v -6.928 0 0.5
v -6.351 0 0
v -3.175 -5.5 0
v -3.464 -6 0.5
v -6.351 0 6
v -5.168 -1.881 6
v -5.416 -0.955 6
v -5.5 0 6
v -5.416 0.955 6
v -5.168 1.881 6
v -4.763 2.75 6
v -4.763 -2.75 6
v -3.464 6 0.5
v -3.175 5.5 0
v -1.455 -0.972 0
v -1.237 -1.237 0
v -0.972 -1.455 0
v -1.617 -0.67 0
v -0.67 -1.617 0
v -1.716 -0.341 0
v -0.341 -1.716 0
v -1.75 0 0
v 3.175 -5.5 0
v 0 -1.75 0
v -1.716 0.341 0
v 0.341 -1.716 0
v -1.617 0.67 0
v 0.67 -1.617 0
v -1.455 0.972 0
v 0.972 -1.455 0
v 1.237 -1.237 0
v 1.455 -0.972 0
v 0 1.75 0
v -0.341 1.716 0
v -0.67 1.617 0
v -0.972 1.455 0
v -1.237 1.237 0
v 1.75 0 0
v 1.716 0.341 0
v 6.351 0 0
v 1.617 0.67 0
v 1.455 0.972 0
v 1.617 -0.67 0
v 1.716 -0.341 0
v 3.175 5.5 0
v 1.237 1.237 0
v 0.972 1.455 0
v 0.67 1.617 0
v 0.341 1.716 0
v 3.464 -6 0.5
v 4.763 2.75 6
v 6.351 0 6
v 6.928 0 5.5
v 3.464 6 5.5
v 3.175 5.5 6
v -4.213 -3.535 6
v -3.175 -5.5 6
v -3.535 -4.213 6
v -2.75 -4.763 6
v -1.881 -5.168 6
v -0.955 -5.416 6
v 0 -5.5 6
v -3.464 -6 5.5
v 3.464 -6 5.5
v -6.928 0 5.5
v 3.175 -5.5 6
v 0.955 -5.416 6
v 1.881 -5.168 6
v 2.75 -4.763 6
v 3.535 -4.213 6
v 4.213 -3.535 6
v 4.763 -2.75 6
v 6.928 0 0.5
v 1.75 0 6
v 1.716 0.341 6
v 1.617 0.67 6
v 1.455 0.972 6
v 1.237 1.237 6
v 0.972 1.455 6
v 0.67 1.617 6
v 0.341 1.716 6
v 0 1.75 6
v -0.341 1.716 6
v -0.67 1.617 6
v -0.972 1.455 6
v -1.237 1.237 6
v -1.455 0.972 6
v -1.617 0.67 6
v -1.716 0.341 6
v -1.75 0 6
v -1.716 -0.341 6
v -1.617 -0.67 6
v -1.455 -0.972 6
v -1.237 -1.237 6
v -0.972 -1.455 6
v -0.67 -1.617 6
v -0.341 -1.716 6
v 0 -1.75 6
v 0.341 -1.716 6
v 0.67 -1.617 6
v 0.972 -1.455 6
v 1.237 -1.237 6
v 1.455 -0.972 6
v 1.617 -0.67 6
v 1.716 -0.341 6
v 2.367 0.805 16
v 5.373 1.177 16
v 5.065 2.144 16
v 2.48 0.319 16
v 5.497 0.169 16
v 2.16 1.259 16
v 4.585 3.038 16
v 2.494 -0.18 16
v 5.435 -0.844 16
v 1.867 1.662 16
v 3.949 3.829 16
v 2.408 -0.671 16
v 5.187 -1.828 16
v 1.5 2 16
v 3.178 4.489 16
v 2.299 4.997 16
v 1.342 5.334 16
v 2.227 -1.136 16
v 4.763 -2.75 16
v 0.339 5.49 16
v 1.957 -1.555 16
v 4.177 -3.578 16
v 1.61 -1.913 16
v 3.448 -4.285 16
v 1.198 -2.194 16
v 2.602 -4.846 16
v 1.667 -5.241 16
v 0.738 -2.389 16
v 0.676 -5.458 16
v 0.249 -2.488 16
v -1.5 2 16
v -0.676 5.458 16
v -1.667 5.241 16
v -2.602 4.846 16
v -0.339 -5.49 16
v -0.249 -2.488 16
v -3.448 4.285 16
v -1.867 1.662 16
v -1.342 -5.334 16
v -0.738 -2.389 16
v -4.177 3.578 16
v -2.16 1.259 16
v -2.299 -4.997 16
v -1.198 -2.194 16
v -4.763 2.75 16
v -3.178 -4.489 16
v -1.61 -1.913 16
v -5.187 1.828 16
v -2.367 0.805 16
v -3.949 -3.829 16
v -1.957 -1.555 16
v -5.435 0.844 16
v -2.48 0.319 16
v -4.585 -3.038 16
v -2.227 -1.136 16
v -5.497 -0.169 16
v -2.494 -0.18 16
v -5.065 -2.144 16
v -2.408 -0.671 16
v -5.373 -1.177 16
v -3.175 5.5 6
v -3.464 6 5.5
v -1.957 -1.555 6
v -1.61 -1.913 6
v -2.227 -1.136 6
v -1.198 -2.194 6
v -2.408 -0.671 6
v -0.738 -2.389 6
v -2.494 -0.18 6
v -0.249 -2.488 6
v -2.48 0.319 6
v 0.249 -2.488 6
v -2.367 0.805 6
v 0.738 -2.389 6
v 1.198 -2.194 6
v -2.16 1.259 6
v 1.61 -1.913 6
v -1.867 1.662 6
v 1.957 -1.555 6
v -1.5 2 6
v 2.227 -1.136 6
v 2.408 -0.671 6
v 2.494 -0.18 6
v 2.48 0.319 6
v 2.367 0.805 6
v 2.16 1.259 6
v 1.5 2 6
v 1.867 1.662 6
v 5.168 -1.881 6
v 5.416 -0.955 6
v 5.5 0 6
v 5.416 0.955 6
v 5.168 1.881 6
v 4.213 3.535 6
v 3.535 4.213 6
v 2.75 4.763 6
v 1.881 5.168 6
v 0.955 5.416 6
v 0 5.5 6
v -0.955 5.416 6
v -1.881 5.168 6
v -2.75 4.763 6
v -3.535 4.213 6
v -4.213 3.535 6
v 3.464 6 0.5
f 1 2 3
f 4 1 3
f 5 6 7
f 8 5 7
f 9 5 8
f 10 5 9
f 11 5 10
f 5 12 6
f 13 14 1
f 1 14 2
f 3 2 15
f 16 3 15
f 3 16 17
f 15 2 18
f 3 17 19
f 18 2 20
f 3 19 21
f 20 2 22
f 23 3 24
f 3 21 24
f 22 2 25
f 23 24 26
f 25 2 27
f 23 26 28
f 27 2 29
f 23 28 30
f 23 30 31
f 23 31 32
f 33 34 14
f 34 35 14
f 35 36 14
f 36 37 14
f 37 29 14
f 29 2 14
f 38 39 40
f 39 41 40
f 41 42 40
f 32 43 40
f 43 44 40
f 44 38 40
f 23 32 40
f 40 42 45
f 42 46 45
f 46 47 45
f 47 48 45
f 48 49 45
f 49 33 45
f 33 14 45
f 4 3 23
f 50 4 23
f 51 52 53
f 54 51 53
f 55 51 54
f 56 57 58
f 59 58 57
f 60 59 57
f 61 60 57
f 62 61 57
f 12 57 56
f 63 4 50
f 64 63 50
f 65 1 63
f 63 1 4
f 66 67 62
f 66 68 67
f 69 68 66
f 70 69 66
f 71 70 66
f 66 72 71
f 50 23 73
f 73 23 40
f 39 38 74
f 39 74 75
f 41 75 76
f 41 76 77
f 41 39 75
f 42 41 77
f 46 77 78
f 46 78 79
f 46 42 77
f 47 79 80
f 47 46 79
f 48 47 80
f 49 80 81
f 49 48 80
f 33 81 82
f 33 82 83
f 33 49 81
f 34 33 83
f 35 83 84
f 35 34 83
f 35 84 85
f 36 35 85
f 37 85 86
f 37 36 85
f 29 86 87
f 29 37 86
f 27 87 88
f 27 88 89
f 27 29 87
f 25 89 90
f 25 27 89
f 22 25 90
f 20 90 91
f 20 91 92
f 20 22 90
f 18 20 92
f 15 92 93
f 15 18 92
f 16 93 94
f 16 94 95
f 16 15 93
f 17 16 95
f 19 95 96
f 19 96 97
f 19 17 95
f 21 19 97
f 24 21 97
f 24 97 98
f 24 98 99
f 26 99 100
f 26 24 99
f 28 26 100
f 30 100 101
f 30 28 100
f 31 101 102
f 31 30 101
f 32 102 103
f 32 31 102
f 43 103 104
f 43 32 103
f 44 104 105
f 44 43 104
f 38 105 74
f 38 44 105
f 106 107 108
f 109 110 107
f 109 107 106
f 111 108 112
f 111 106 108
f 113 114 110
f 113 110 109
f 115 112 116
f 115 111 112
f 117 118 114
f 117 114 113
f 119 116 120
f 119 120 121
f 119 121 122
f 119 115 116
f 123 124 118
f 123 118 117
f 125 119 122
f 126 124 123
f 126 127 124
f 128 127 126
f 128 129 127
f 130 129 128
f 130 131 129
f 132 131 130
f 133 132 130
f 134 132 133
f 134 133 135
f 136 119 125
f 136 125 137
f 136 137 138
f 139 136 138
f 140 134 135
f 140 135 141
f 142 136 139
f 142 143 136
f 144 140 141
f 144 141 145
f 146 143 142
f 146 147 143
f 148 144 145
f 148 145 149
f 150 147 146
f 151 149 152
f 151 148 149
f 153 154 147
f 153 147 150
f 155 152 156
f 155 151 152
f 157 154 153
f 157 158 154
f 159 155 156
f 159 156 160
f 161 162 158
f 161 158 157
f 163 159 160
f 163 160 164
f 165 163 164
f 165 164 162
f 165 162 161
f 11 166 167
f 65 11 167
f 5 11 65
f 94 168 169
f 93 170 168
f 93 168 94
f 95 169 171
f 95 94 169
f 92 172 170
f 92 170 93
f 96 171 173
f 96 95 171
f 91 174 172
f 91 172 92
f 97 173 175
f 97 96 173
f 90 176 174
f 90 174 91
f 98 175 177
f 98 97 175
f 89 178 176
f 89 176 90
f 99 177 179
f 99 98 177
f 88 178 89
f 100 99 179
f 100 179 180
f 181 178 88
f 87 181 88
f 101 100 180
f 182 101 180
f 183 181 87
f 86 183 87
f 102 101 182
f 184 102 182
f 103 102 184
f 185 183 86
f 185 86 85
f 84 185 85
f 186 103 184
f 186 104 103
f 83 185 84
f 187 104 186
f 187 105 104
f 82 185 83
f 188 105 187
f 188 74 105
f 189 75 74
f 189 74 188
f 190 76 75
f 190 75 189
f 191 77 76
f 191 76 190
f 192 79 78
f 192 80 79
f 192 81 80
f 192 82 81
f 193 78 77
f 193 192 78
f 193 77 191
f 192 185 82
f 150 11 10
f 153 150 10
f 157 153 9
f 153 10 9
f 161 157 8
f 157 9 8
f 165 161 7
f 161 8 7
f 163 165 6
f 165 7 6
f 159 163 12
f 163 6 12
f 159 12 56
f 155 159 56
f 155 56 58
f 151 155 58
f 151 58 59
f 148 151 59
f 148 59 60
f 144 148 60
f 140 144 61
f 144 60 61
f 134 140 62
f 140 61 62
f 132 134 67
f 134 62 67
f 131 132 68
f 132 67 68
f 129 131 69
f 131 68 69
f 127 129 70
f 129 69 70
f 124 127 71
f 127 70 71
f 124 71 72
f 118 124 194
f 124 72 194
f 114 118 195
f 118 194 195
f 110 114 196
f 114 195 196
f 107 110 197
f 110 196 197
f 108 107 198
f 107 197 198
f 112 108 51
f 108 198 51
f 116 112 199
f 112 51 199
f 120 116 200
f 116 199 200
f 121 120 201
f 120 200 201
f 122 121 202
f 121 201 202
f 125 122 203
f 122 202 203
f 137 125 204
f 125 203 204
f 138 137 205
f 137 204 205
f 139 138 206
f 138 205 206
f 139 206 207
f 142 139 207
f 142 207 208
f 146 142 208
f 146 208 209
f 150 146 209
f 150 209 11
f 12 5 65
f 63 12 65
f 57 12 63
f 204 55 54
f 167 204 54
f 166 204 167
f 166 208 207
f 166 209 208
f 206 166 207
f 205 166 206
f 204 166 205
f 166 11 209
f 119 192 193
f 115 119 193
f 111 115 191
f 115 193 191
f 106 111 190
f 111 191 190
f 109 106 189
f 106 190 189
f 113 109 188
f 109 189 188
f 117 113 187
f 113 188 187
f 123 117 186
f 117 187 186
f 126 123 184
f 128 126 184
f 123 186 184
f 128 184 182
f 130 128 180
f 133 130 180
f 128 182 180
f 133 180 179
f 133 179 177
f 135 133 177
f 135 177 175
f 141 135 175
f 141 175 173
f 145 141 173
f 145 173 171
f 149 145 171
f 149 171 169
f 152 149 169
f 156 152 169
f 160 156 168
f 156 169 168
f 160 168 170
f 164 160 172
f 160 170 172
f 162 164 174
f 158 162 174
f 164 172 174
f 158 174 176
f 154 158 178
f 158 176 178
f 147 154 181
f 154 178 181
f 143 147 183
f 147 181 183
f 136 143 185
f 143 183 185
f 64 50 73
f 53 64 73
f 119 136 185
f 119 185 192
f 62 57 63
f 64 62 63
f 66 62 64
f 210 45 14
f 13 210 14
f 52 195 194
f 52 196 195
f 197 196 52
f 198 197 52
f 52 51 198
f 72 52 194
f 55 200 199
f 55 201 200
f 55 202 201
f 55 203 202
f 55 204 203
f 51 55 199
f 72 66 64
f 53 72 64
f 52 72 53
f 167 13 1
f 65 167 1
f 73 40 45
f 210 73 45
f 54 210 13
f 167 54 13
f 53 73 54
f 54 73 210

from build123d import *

# Parameters (mm, degrees)
SKETCH_1_R      = 1.75
EXTRUDE_1_DEPTH = 6
CHAMFER_1_SIZE  = 0.5
SKETCH_2_R      = 5.5
EXTRUDE_2_DEPTH = 10


with BuildPart() as part:
    # 草图1 → 凸台-拉伸1 (new body)
    with BuildSketch(Plane.XY):
        Polygon((3.464101615, 6), (-3.464101615, 6), (-6.92820323, 0), (-3.464101615, -6), (3.464101615, -6), (6.92820323, 0), align=None)
        Circle(SKETCH_1_R, mode=Mode.SUBTRACT)
    extrude(amount=EXTRUDE_1_DEPTH)

    # 倒角1
    chamfer_1_edges = [part.edges().sort_by_distance(p)[0] for p in [
        (-5.196152423, 3, 6),
        (-5.196152423, -3, 6),
        (0, -6, 6),
        (5.196152423, -3, 6),
        (5.196152423, 3, 6),
        (5.196152423, -3, 0),
        (0, -6, 0),
        (-5.196152423, -3, 0),
        (-5.196152423, 3, 0),
        (0, 6, 0),
        (5.196152423, 3, 0),
        (0, 6, 6),
    ]]
    chamfer(chamfer_1_edges, length=CHAMFER_1_SIZE)

    # 草图2 → 凸台-拉伸2 (add)
    with BuildSketch(Plane.XY.offset(6)):
        with Locations(Location((0, 0, 0), (0, 0, 150))):
            Circle(SKETCH_2_R)
        with BuildLine():
            Line((-1.5, 2), (1.5, 2))
            ThreePointArc((1.5, 2), (0, -2.5), (-1.5, 2))
        make_face(mode=Mode.SUBTRACT)
    extrude(amount=EXTRUDE_2_DEPTH)


solid = part.part
